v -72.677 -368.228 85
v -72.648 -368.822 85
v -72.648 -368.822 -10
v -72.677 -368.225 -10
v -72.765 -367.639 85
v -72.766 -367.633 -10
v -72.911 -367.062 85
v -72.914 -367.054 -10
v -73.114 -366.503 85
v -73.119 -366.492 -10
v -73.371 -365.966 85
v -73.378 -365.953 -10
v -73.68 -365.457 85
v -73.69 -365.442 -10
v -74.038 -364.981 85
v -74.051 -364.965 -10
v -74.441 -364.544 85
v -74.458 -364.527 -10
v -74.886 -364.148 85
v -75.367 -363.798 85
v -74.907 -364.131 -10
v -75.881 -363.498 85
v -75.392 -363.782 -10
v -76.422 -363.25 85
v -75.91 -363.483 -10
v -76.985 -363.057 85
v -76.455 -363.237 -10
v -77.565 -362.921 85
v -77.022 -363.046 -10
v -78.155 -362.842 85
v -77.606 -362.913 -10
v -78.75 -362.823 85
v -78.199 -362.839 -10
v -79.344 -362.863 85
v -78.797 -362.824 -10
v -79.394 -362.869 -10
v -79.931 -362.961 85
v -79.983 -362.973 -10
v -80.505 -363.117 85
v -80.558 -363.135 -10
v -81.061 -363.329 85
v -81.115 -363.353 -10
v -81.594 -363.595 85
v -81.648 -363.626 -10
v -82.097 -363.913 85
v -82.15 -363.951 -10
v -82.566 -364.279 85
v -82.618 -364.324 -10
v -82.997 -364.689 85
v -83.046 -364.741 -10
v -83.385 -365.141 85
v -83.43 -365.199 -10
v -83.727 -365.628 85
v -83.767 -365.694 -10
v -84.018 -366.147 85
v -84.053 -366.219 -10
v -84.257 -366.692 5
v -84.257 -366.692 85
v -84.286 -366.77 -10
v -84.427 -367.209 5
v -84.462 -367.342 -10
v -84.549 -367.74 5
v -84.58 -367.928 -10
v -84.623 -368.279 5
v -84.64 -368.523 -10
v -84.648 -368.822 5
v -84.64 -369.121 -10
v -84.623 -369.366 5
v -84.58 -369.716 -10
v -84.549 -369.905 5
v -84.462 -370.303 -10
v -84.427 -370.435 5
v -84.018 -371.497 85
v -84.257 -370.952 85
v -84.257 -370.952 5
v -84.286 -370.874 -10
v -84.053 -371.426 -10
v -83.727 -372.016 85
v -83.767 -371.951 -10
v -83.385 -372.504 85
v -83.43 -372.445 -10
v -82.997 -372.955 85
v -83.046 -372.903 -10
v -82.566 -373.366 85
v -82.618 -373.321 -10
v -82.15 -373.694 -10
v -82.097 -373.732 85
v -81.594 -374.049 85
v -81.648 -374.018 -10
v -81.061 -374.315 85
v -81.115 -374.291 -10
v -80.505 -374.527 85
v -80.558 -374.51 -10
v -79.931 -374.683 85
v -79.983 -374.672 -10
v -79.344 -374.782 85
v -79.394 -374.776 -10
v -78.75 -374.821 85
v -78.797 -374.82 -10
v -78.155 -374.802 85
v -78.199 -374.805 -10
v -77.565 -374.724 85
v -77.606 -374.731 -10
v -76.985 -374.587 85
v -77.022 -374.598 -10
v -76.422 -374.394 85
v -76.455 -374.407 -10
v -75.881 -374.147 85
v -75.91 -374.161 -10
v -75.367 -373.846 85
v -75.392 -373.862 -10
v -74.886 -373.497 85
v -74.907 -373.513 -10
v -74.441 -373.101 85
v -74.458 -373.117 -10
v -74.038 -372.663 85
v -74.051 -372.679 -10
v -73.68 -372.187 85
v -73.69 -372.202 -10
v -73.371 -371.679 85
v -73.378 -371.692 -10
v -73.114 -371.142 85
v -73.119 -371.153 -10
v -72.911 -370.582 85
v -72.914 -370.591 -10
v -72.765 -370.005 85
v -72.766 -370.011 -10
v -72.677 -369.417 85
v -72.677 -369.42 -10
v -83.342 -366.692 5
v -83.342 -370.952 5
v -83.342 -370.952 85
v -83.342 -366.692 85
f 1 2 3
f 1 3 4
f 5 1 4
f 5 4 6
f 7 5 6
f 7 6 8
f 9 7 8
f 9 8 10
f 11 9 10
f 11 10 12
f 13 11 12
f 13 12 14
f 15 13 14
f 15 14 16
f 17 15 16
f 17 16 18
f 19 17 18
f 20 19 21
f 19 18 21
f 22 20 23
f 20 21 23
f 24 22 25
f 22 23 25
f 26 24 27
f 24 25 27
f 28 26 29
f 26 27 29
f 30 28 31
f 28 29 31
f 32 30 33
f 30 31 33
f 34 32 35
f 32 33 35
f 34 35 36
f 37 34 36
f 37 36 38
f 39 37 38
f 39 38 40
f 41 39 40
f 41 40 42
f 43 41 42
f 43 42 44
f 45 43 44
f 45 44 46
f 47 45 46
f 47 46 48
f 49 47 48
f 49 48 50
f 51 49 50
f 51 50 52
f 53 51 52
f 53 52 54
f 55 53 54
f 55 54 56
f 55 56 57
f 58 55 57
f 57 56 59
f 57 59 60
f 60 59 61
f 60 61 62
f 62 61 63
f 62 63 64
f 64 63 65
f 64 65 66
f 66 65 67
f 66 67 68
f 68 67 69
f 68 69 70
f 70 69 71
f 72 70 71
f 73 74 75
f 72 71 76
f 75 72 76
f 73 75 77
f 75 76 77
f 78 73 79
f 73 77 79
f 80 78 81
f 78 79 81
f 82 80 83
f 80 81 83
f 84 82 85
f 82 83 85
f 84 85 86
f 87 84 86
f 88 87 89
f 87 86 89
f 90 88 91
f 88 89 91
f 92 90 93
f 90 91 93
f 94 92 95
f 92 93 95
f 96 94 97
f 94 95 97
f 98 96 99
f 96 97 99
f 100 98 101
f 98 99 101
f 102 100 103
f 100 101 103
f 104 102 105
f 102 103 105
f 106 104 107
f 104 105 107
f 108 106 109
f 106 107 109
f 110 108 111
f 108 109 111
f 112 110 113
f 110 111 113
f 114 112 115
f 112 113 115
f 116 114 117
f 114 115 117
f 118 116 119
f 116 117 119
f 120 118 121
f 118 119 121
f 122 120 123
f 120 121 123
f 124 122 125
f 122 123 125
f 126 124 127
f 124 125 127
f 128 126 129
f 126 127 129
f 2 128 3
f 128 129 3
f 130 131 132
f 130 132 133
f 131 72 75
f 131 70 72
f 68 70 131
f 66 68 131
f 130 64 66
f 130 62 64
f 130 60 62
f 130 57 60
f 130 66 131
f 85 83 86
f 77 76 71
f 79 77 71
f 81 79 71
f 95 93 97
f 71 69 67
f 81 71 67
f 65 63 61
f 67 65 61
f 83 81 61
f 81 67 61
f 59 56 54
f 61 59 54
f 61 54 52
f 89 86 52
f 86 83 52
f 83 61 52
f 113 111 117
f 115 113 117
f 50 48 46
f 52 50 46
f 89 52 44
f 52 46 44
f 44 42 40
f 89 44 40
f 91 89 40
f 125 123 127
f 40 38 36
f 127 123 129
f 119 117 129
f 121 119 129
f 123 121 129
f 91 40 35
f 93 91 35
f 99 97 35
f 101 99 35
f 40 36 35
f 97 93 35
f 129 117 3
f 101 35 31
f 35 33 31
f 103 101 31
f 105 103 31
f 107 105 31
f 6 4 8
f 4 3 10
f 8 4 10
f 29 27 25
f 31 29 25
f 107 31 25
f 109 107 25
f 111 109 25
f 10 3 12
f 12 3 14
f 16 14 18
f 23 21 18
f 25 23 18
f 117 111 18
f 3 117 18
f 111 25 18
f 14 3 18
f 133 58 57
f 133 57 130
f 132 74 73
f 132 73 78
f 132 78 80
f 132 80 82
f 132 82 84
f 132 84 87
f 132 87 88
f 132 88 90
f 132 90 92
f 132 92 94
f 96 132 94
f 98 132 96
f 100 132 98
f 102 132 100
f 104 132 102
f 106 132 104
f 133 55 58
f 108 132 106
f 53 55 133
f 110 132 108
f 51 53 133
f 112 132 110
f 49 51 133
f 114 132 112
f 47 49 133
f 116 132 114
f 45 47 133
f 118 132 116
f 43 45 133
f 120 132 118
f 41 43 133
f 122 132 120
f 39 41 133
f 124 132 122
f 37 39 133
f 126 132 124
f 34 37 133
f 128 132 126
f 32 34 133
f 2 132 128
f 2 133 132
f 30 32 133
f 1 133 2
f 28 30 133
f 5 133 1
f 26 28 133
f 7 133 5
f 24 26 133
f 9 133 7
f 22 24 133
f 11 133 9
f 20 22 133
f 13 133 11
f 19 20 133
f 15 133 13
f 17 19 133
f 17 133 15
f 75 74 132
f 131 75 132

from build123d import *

# Parameters (mm, degrees)
BOSS_EXTRUDE1_DEPTH      = 85
BOSS_EXTRUDE1_DEPTH_BACK = 10
SKETCH1_R                = 6
SKETCH2_W                = 2.203214475
SKETCH2_H                = 4.25945658
CUT_EXTRUDE1_DEPTH       = 80


with BuildPart() as part:
    # Sketch1 → Boss-Extrude1 (new, two sides: drawn at the far end of the back side and taken through both)
    with BuildSketch(Plane.XY.offset(-BOSS_EXTRUDE1_DEPTH_BACK)):
        with Locations((-78.64751379, -368.822211525)):
            Circle(SKETCH1_R)
    extrude(amount=BOSS_EXTRUDE1_DEPTH + BOSS_EXTRUDE1_DEPTH_BACK)

    # Sketch2 → Cut-Extrude1 (cut)
    with BuildSketch(Plane.XY.offset(85)):
        with Locations((-84.444038678, -368.822211525)):
            Rectangle(SKETCH2_W, SKETCH2_H)
    extrude(amount=-CUT_EXTRUDE1_DEPTH, mode=Mode.SUBTRACT)


solid = part.part
